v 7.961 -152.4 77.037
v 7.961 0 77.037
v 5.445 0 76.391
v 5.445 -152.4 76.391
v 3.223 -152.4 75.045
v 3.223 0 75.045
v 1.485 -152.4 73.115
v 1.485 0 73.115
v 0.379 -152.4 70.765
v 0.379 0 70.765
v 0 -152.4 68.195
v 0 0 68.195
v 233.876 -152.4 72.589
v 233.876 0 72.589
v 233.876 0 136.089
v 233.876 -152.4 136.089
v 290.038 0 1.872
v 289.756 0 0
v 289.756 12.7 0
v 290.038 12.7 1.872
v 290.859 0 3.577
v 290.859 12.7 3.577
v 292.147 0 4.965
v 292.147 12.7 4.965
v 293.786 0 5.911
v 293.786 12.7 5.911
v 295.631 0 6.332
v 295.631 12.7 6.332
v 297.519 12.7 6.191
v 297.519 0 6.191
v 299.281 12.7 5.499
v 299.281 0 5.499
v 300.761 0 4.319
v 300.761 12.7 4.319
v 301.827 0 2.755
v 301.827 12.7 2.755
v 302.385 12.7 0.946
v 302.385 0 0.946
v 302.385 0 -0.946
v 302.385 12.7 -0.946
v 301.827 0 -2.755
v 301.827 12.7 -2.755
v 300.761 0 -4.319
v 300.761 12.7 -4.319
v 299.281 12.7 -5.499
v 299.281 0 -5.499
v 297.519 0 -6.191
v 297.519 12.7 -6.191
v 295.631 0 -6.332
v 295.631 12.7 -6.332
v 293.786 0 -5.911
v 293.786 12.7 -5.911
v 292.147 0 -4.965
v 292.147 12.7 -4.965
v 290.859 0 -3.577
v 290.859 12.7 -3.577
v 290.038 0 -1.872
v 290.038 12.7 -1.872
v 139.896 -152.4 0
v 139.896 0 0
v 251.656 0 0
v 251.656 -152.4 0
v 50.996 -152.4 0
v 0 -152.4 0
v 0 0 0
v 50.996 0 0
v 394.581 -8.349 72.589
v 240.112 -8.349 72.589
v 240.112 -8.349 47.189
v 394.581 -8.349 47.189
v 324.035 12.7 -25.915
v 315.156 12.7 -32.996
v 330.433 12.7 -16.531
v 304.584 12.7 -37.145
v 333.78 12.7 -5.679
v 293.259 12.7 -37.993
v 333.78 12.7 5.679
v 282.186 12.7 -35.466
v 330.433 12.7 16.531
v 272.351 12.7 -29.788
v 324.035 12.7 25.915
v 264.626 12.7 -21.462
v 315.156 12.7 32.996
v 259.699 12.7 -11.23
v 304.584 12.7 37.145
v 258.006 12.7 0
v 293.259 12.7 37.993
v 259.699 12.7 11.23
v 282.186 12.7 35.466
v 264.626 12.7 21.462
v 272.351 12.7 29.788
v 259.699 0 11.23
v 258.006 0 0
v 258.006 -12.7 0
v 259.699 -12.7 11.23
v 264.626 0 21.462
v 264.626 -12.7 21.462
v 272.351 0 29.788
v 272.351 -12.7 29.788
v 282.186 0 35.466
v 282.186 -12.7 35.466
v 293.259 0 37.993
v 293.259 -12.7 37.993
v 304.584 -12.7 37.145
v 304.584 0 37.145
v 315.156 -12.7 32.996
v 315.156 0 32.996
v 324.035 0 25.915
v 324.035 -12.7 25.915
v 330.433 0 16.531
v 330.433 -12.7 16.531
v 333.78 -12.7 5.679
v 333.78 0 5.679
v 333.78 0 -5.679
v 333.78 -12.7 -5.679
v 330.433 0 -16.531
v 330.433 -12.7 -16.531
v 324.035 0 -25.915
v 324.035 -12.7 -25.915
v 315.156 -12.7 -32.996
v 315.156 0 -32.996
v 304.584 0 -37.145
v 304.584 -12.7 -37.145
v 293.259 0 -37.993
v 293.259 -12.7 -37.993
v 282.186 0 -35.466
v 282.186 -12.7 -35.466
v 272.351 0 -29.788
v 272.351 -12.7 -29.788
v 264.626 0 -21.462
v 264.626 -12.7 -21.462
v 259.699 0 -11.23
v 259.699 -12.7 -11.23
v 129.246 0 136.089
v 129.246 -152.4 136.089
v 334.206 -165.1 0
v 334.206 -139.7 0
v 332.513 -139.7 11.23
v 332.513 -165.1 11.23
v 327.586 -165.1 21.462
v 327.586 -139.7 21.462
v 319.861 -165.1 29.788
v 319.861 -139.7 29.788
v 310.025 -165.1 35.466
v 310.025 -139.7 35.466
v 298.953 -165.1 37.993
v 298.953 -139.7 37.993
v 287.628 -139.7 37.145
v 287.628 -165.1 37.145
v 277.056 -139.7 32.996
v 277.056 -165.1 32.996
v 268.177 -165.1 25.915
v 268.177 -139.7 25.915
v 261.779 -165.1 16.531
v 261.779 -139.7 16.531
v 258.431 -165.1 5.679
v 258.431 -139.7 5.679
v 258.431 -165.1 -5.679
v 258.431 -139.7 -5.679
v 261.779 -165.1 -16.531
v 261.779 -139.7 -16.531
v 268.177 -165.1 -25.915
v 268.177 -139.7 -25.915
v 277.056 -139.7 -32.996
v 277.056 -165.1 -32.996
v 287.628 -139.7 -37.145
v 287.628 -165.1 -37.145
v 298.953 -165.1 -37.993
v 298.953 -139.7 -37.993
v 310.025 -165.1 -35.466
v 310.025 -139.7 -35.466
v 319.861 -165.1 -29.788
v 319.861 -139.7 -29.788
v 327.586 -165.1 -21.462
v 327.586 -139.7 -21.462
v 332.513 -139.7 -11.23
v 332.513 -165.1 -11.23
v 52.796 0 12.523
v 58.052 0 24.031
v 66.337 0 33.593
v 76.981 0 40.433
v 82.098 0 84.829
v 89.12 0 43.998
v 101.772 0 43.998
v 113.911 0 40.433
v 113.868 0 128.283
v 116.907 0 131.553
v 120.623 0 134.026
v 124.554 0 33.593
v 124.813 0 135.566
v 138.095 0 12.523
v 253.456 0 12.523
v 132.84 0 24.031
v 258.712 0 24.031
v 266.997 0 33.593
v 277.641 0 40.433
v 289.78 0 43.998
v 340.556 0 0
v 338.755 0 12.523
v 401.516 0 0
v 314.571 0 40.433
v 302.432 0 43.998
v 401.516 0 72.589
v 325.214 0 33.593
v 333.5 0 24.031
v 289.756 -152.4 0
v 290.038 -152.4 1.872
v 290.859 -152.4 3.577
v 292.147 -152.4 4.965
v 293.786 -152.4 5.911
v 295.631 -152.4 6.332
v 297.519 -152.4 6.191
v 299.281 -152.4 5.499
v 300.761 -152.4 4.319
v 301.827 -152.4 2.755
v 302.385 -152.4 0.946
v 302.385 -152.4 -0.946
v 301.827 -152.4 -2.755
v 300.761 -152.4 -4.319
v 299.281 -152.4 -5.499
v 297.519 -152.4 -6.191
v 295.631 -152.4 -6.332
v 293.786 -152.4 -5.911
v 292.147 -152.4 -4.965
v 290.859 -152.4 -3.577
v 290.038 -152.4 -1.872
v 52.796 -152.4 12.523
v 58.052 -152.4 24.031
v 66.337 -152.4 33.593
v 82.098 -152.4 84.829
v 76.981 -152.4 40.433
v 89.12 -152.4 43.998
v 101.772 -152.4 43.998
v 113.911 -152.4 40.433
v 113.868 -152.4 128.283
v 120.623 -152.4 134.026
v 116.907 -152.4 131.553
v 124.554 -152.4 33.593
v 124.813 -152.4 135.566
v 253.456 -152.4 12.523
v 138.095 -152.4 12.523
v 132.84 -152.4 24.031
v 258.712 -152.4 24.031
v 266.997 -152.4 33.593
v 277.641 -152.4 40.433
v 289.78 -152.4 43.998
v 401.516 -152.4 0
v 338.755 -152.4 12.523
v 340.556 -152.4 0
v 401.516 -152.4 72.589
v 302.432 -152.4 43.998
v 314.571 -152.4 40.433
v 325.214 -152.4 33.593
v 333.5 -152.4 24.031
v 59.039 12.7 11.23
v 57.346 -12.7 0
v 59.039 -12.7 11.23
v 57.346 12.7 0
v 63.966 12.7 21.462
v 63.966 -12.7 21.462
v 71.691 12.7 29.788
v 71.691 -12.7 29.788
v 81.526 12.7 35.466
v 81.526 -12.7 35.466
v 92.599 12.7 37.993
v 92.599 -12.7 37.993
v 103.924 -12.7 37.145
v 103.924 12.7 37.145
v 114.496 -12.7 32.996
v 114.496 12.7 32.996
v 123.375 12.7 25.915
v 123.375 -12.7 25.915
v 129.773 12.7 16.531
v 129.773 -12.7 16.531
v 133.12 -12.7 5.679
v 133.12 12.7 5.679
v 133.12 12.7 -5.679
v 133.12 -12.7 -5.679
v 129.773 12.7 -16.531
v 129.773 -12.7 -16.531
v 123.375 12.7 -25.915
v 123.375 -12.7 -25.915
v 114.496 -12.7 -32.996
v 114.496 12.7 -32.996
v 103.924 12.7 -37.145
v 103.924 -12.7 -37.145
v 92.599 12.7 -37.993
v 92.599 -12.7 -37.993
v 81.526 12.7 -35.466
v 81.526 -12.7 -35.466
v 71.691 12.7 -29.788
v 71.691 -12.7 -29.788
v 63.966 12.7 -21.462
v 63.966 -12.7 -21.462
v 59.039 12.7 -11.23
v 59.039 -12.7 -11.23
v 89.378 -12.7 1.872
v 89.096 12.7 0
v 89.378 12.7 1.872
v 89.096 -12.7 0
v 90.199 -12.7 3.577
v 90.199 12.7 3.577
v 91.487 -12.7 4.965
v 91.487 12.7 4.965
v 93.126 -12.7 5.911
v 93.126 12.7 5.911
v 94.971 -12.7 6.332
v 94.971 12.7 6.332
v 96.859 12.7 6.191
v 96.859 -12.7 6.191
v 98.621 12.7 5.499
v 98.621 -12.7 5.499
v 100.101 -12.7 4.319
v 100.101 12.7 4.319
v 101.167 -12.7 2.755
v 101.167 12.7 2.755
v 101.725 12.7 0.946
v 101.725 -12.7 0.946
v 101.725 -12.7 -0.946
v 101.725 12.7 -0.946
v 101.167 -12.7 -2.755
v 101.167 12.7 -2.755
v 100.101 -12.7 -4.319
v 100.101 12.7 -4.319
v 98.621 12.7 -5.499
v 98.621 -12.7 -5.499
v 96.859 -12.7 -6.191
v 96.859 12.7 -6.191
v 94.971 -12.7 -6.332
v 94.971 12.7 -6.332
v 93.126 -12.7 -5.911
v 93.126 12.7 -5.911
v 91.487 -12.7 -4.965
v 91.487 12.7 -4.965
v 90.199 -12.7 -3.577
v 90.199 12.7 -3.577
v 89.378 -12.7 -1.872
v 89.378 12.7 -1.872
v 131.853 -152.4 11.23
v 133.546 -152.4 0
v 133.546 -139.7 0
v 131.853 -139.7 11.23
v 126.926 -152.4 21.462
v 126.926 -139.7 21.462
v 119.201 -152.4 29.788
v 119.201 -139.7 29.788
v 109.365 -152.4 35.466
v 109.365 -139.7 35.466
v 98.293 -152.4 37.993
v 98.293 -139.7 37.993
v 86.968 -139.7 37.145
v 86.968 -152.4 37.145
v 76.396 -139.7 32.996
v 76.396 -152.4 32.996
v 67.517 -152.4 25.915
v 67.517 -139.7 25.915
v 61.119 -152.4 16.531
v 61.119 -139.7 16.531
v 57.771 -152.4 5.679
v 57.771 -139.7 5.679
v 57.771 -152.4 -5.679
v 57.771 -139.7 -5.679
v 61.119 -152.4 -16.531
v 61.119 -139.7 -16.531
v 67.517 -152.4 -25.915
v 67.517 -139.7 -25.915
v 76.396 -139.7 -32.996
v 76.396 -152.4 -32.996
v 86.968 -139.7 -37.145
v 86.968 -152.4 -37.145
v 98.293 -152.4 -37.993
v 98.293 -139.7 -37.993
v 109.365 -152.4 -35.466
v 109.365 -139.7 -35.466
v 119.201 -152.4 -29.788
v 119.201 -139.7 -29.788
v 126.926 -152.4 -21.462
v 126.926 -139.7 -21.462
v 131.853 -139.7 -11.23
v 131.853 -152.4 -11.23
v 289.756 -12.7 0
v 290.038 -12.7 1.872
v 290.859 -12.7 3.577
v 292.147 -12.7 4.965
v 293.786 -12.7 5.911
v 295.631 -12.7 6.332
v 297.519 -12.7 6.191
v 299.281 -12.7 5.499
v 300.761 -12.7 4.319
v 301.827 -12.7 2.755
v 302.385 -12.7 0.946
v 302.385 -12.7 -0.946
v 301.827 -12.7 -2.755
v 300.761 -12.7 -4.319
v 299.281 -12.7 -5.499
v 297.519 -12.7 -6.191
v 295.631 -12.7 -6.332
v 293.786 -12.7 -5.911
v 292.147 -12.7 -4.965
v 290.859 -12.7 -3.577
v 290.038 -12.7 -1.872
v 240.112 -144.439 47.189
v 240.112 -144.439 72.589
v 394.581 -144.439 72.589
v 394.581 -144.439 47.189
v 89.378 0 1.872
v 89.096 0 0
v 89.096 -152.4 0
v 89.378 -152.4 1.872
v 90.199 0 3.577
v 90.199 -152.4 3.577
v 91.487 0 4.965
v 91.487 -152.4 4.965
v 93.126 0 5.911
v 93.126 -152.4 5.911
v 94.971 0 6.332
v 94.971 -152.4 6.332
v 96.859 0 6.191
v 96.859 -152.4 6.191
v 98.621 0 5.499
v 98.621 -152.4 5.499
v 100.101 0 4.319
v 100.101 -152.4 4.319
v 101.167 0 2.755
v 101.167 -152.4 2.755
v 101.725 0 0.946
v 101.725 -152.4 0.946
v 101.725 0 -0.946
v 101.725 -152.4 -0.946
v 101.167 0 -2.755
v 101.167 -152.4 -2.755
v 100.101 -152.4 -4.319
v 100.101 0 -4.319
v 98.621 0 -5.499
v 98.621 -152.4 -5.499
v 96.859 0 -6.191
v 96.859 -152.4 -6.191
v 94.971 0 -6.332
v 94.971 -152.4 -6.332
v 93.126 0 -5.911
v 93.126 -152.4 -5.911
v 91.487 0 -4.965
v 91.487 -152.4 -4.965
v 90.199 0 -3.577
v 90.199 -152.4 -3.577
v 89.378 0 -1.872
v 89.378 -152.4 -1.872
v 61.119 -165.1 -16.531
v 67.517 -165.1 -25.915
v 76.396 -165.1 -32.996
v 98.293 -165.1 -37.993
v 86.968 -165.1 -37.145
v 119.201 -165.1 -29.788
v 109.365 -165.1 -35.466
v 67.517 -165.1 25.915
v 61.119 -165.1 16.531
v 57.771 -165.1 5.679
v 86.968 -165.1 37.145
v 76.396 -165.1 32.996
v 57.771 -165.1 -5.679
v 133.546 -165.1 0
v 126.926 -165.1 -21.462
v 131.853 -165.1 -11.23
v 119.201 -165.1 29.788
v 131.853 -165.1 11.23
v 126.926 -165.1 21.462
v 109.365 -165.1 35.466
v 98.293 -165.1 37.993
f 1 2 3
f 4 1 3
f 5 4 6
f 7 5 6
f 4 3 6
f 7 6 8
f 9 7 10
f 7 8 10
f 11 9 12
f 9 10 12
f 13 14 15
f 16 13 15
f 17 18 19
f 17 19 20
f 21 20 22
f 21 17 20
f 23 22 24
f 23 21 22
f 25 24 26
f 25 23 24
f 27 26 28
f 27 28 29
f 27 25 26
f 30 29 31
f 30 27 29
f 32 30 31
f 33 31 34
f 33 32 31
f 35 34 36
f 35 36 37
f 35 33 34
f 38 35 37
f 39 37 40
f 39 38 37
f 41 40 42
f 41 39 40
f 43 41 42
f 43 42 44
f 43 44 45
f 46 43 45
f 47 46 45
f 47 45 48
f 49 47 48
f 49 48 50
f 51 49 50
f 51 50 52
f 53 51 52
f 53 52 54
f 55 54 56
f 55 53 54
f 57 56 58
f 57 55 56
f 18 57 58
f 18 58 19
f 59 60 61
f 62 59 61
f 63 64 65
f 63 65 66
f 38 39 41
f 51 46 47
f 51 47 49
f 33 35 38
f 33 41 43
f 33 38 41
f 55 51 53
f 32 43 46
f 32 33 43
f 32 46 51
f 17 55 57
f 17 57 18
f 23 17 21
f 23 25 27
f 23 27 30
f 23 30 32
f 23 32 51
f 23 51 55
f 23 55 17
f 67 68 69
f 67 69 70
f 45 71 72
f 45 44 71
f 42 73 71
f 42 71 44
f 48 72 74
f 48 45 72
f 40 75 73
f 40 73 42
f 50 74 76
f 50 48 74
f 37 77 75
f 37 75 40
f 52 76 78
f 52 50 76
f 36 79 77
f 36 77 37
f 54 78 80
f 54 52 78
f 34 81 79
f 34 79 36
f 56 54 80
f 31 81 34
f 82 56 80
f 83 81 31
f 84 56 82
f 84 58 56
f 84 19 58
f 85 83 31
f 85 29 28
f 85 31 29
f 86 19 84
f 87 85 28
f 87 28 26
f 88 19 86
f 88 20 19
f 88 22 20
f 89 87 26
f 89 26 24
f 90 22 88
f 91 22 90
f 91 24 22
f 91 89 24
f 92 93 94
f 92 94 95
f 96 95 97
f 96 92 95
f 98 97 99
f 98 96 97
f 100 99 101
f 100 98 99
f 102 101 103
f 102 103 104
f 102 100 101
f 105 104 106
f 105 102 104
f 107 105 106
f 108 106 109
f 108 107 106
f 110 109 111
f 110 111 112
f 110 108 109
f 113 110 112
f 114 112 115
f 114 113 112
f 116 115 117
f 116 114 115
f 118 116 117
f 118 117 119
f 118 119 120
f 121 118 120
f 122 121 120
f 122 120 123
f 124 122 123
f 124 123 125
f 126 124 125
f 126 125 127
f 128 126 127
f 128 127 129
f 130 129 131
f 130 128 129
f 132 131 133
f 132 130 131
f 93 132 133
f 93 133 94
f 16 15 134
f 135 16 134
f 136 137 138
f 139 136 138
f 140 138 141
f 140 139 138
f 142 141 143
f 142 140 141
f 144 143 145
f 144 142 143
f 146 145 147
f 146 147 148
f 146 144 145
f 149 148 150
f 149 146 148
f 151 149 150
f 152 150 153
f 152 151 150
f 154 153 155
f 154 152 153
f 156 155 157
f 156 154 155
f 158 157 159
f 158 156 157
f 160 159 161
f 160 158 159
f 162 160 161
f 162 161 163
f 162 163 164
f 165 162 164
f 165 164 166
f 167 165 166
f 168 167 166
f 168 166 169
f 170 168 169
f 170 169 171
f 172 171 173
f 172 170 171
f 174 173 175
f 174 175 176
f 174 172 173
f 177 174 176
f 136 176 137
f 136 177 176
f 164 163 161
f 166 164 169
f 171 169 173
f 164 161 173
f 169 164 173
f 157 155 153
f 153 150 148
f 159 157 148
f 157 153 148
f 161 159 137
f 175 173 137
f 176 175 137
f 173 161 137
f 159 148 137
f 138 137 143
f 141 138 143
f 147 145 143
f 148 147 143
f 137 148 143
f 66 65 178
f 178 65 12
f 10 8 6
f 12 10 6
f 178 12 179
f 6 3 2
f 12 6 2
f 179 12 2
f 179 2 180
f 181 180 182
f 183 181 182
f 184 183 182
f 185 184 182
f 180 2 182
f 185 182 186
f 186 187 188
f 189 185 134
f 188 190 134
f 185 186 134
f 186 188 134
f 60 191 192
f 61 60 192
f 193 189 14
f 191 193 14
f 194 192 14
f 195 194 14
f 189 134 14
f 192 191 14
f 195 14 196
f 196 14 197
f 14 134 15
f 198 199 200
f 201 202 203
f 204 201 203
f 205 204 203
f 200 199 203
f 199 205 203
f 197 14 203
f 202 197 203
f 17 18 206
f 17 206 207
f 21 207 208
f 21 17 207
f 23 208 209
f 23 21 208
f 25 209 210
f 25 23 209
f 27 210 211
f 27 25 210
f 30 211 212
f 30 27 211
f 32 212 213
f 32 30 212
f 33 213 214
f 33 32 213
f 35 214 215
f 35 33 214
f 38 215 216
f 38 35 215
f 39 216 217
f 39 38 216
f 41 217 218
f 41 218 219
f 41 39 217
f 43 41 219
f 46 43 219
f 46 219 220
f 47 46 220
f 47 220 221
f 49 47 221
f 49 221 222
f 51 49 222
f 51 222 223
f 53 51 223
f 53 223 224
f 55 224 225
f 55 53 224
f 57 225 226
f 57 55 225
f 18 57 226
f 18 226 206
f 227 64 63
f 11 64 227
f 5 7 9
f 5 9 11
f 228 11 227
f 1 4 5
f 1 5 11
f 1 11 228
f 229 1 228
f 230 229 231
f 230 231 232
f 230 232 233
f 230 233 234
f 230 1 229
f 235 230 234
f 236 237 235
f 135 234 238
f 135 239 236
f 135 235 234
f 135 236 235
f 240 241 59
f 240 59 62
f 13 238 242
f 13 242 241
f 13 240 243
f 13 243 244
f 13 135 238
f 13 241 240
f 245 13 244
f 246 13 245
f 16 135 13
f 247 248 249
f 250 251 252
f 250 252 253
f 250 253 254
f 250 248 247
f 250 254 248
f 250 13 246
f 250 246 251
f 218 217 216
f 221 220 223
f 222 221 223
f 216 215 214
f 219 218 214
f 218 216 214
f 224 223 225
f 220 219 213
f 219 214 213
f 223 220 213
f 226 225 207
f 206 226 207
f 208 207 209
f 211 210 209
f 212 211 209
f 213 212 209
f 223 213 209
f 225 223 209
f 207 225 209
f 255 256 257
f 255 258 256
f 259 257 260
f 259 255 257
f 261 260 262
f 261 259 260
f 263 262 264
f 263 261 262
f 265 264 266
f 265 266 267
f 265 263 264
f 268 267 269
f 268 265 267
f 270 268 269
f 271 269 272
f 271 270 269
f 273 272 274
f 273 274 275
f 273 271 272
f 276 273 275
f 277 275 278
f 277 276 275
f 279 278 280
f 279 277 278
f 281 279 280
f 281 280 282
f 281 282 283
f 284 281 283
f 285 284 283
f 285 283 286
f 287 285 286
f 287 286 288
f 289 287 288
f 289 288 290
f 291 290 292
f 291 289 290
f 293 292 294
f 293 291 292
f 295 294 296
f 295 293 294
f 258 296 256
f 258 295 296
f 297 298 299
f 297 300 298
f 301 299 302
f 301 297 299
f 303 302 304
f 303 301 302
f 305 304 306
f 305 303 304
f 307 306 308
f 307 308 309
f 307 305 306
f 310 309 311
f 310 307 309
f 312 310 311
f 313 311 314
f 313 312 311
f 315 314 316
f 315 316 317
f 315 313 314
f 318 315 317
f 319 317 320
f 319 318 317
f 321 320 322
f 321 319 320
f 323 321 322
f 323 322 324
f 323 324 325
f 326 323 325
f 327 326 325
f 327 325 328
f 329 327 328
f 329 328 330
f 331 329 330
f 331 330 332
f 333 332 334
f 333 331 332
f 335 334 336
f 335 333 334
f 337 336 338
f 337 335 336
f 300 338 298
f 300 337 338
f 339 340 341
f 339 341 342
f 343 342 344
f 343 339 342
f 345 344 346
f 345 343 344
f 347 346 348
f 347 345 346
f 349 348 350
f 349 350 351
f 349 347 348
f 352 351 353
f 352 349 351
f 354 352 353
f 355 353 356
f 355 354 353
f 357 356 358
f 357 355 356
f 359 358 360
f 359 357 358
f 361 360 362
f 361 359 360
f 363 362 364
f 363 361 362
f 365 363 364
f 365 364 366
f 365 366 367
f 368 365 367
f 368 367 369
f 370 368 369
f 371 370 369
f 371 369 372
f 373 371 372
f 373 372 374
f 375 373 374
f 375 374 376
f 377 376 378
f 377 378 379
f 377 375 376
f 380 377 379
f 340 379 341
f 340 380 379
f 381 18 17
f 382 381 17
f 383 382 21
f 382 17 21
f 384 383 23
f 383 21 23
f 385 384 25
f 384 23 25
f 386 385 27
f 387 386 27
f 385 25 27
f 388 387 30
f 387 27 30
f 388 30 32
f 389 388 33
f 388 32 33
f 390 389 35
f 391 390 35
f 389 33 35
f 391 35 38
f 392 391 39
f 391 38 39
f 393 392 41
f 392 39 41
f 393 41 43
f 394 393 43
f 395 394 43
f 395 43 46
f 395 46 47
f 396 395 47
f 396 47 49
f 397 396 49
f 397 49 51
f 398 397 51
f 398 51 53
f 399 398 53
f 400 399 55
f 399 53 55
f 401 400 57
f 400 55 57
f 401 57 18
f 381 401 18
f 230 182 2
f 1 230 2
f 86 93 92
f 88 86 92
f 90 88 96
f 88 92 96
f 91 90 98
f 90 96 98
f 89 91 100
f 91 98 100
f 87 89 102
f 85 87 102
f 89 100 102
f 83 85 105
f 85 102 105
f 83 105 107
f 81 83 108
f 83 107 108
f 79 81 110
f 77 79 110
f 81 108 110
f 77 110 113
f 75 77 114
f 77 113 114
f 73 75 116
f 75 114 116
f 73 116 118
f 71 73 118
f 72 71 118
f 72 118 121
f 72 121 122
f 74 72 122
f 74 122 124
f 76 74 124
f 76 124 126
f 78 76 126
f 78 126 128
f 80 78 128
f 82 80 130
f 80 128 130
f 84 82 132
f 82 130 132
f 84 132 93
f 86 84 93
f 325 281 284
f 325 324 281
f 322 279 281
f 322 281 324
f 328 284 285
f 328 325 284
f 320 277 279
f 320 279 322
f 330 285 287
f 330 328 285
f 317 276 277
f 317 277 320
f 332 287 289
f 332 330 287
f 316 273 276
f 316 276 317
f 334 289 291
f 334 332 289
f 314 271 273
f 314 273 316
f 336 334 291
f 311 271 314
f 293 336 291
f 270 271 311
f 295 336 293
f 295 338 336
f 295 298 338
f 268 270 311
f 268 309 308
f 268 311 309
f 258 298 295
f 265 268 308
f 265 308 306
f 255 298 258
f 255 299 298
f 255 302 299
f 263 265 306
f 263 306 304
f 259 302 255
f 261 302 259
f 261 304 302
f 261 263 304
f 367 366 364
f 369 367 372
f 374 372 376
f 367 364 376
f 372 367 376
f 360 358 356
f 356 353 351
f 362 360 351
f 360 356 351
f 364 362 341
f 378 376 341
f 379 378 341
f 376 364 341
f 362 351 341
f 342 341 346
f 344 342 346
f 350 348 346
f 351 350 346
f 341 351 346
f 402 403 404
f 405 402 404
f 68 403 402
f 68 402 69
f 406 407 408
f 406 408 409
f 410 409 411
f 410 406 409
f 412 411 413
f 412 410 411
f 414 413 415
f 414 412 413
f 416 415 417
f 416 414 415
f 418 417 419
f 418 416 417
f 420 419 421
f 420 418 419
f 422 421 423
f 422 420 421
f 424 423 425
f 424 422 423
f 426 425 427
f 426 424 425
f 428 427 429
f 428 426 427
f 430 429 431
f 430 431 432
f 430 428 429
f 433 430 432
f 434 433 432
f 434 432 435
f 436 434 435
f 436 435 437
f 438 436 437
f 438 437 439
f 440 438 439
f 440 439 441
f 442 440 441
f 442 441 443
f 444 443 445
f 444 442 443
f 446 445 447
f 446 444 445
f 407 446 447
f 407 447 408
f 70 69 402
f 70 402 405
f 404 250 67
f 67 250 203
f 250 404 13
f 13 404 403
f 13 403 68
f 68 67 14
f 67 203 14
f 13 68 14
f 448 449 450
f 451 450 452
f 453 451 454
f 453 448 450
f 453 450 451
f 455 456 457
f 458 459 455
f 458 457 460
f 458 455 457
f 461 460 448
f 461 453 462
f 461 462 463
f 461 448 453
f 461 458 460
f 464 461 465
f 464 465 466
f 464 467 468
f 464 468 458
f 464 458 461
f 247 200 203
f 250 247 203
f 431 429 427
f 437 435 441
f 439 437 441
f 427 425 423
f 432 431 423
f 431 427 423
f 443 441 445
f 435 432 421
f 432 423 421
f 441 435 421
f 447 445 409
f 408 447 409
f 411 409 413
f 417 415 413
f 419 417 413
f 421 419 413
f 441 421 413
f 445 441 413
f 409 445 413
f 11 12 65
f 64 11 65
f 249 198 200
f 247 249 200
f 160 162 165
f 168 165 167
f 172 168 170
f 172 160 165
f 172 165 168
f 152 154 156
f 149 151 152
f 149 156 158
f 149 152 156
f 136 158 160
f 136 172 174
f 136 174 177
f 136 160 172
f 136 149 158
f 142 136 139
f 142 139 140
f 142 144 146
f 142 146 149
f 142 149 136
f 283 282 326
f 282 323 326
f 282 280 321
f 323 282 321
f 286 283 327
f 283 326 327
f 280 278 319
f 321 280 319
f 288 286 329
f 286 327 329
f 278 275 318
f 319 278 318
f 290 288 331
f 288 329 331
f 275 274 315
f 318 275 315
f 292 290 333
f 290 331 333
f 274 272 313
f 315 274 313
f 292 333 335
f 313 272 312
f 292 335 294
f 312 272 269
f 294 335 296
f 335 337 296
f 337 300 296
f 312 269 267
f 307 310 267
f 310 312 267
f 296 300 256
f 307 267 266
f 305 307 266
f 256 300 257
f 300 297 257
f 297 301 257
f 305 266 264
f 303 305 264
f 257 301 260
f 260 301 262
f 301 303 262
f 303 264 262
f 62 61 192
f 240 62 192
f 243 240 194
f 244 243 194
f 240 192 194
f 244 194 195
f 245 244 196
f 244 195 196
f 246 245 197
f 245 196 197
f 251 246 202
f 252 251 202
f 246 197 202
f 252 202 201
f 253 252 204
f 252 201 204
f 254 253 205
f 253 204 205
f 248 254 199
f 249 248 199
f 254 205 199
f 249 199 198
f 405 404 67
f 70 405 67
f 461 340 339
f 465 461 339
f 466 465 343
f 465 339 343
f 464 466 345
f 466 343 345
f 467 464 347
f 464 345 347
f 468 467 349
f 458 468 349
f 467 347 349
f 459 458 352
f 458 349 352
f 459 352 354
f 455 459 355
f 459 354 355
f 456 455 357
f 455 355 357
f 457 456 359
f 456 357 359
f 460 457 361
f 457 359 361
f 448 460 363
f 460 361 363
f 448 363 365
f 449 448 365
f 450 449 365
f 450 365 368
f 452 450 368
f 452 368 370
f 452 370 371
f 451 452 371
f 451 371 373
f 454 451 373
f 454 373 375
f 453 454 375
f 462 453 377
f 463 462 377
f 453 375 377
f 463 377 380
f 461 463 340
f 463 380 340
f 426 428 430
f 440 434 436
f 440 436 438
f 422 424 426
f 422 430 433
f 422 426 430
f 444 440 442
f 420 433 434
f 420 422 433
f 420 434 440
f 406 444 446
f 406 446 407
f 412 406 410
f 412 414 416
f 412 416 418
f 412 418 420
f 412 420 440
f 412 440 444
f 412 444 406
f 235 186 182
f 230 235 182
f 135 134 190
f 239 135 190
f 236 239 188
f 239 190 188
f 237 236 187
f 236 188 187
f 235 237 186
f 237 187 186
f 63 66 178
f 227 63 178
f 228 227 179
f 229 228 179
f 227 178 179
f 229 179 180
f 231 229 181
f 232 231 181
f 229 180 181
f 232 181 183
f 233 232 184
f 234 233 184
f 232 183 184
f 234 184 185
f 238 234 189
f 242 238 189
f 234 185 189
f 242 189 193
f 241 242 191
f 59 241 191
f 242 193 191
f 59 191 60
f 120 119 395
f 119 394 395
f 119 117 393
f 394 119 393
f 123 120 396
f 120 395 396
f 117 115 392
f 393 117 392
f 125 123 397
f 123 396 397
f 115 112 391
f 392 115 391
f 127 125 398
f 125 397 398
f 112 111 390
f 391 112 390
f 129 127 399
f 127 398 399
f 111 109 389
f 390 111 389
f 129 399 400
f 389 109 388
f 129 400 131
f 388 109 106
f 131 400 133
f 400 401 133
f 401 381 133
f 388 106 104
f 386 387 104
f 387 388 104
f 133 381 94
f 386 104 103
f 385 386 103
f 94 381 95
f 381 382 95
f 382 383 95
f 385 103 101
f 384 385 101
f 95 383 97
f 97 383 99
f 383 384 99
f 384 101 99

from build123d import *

# Parameters (mm, degrees)
F1_DEPTH = 152.4
F2_R     = 38.1
F3_DEPTH = 12.7
F4_R     = 6.35
F5_DEPTH = 152.4
F4_R_2   = 38.1
F6_DEPTH = 12.7
F7_W     = 154.46949
F7_H     = 136.090693
F8_DEPTH = 25.4


with BuildPart() as f1:
    # F0 (on Front) → F1 (new body)
    with BuildSketch(Plane.XZ):
        with BuildLine():
            Line((0, 68.195408), (0, 0))
            Line((0, 0), (50.9959, 0))
            ThreePointArc((50.9959, 0), (95.4459, 44.45), (139.8959, 0))
            Line((139.8959, 0), (251.6559, 0))
            ThreePointArc((251.6559, 0), (296.1059, 44.45), (340.5559, 0))
            Line((340.5559, 0), (401.5159, 0))
            Line((401.5159, 0), (401.5159, 72.589343))
            Line((401.5159, 72.589343), (233.8759, 72.589343))
            Line((233.8759, 72.589343), (233.8759, 136.089343))
            Line((233.8759, 136.089343), (129.246439, 136.089343))
            ThreePointArc((129.246439, 136.089343), (120.623358, 134.025954), (113.868284, 128.282778))
            Line((113.868284, 128.282778), (82.097782, 84.828825))
            Line((82.097782, 84.828825), (7.960742, 77.036708))
            ThreePointArc((7.960742, 77.036708), (2.283443, 74.143979), (0, 68.195408))
        make_face()
    extrude(amount=F1_DEPTH)

    # F7 (on face) → F8 (cut)
    with BuildSketch(Plane.XY.offset(72.589343)):
        with Locations((317.346245, -76.394113)):
            Rectangle(F7_W, F7_H)
    extrude(amount=-F8_DEPTH, mode=Mode.SUBTRACT)


with BuildPart() as f3:
    # F2 (on face) → F3 (new body, symmetric)
    with BuildSketch(Plane.XZ.offset(152.4)):
        with Locations((95.4459, 0)):
            Circle(F2_R)
        with Locations((296.1059, 0)):
            Circle(F2_R)
    extrude(amount=F3_DEPTH, both=True)


with BuildPart() as f5:
    # F4 (on face) → F5 (new body)
    with BuildSketch(Plane(origin=(0, 0, 0), x_dir=(-1, 0, 0), z_dir=(0, 1, 0))):
        with Locations((-296.1059, 0)):
            Circle(F4_R)
        with Locations((-95.4459, 0)):
            Circle(F4_R)
    extrude(amount=-F5_DEPTH)


with BuildPart() as f6:
    # F4 (on face) → F6 (new body, symmetric)
    with BuildSketch(Plane(origin=(0, 0, 0), x_dir=(-1, 0, 0), z_dir=(0, 1, 0))):
        with Locations((-296.1059, 0)):
            Circle(F4_R_2)
        with Locations((-296.1059, 0)):
            Circle(F4_R, mode=Mode.SUBTRACT)
        with Locations((-95.4459, 0)):
            Circle(F4_R_2)
        with Locations((-95.4459, 0)):
            Circle(F4_R, mode=Mode.SUBTRACT)
    extrude(amount=F6_DEPTH, both=True)


solid = Compound([f1.part, f3.part, f5.part, f6.part])
